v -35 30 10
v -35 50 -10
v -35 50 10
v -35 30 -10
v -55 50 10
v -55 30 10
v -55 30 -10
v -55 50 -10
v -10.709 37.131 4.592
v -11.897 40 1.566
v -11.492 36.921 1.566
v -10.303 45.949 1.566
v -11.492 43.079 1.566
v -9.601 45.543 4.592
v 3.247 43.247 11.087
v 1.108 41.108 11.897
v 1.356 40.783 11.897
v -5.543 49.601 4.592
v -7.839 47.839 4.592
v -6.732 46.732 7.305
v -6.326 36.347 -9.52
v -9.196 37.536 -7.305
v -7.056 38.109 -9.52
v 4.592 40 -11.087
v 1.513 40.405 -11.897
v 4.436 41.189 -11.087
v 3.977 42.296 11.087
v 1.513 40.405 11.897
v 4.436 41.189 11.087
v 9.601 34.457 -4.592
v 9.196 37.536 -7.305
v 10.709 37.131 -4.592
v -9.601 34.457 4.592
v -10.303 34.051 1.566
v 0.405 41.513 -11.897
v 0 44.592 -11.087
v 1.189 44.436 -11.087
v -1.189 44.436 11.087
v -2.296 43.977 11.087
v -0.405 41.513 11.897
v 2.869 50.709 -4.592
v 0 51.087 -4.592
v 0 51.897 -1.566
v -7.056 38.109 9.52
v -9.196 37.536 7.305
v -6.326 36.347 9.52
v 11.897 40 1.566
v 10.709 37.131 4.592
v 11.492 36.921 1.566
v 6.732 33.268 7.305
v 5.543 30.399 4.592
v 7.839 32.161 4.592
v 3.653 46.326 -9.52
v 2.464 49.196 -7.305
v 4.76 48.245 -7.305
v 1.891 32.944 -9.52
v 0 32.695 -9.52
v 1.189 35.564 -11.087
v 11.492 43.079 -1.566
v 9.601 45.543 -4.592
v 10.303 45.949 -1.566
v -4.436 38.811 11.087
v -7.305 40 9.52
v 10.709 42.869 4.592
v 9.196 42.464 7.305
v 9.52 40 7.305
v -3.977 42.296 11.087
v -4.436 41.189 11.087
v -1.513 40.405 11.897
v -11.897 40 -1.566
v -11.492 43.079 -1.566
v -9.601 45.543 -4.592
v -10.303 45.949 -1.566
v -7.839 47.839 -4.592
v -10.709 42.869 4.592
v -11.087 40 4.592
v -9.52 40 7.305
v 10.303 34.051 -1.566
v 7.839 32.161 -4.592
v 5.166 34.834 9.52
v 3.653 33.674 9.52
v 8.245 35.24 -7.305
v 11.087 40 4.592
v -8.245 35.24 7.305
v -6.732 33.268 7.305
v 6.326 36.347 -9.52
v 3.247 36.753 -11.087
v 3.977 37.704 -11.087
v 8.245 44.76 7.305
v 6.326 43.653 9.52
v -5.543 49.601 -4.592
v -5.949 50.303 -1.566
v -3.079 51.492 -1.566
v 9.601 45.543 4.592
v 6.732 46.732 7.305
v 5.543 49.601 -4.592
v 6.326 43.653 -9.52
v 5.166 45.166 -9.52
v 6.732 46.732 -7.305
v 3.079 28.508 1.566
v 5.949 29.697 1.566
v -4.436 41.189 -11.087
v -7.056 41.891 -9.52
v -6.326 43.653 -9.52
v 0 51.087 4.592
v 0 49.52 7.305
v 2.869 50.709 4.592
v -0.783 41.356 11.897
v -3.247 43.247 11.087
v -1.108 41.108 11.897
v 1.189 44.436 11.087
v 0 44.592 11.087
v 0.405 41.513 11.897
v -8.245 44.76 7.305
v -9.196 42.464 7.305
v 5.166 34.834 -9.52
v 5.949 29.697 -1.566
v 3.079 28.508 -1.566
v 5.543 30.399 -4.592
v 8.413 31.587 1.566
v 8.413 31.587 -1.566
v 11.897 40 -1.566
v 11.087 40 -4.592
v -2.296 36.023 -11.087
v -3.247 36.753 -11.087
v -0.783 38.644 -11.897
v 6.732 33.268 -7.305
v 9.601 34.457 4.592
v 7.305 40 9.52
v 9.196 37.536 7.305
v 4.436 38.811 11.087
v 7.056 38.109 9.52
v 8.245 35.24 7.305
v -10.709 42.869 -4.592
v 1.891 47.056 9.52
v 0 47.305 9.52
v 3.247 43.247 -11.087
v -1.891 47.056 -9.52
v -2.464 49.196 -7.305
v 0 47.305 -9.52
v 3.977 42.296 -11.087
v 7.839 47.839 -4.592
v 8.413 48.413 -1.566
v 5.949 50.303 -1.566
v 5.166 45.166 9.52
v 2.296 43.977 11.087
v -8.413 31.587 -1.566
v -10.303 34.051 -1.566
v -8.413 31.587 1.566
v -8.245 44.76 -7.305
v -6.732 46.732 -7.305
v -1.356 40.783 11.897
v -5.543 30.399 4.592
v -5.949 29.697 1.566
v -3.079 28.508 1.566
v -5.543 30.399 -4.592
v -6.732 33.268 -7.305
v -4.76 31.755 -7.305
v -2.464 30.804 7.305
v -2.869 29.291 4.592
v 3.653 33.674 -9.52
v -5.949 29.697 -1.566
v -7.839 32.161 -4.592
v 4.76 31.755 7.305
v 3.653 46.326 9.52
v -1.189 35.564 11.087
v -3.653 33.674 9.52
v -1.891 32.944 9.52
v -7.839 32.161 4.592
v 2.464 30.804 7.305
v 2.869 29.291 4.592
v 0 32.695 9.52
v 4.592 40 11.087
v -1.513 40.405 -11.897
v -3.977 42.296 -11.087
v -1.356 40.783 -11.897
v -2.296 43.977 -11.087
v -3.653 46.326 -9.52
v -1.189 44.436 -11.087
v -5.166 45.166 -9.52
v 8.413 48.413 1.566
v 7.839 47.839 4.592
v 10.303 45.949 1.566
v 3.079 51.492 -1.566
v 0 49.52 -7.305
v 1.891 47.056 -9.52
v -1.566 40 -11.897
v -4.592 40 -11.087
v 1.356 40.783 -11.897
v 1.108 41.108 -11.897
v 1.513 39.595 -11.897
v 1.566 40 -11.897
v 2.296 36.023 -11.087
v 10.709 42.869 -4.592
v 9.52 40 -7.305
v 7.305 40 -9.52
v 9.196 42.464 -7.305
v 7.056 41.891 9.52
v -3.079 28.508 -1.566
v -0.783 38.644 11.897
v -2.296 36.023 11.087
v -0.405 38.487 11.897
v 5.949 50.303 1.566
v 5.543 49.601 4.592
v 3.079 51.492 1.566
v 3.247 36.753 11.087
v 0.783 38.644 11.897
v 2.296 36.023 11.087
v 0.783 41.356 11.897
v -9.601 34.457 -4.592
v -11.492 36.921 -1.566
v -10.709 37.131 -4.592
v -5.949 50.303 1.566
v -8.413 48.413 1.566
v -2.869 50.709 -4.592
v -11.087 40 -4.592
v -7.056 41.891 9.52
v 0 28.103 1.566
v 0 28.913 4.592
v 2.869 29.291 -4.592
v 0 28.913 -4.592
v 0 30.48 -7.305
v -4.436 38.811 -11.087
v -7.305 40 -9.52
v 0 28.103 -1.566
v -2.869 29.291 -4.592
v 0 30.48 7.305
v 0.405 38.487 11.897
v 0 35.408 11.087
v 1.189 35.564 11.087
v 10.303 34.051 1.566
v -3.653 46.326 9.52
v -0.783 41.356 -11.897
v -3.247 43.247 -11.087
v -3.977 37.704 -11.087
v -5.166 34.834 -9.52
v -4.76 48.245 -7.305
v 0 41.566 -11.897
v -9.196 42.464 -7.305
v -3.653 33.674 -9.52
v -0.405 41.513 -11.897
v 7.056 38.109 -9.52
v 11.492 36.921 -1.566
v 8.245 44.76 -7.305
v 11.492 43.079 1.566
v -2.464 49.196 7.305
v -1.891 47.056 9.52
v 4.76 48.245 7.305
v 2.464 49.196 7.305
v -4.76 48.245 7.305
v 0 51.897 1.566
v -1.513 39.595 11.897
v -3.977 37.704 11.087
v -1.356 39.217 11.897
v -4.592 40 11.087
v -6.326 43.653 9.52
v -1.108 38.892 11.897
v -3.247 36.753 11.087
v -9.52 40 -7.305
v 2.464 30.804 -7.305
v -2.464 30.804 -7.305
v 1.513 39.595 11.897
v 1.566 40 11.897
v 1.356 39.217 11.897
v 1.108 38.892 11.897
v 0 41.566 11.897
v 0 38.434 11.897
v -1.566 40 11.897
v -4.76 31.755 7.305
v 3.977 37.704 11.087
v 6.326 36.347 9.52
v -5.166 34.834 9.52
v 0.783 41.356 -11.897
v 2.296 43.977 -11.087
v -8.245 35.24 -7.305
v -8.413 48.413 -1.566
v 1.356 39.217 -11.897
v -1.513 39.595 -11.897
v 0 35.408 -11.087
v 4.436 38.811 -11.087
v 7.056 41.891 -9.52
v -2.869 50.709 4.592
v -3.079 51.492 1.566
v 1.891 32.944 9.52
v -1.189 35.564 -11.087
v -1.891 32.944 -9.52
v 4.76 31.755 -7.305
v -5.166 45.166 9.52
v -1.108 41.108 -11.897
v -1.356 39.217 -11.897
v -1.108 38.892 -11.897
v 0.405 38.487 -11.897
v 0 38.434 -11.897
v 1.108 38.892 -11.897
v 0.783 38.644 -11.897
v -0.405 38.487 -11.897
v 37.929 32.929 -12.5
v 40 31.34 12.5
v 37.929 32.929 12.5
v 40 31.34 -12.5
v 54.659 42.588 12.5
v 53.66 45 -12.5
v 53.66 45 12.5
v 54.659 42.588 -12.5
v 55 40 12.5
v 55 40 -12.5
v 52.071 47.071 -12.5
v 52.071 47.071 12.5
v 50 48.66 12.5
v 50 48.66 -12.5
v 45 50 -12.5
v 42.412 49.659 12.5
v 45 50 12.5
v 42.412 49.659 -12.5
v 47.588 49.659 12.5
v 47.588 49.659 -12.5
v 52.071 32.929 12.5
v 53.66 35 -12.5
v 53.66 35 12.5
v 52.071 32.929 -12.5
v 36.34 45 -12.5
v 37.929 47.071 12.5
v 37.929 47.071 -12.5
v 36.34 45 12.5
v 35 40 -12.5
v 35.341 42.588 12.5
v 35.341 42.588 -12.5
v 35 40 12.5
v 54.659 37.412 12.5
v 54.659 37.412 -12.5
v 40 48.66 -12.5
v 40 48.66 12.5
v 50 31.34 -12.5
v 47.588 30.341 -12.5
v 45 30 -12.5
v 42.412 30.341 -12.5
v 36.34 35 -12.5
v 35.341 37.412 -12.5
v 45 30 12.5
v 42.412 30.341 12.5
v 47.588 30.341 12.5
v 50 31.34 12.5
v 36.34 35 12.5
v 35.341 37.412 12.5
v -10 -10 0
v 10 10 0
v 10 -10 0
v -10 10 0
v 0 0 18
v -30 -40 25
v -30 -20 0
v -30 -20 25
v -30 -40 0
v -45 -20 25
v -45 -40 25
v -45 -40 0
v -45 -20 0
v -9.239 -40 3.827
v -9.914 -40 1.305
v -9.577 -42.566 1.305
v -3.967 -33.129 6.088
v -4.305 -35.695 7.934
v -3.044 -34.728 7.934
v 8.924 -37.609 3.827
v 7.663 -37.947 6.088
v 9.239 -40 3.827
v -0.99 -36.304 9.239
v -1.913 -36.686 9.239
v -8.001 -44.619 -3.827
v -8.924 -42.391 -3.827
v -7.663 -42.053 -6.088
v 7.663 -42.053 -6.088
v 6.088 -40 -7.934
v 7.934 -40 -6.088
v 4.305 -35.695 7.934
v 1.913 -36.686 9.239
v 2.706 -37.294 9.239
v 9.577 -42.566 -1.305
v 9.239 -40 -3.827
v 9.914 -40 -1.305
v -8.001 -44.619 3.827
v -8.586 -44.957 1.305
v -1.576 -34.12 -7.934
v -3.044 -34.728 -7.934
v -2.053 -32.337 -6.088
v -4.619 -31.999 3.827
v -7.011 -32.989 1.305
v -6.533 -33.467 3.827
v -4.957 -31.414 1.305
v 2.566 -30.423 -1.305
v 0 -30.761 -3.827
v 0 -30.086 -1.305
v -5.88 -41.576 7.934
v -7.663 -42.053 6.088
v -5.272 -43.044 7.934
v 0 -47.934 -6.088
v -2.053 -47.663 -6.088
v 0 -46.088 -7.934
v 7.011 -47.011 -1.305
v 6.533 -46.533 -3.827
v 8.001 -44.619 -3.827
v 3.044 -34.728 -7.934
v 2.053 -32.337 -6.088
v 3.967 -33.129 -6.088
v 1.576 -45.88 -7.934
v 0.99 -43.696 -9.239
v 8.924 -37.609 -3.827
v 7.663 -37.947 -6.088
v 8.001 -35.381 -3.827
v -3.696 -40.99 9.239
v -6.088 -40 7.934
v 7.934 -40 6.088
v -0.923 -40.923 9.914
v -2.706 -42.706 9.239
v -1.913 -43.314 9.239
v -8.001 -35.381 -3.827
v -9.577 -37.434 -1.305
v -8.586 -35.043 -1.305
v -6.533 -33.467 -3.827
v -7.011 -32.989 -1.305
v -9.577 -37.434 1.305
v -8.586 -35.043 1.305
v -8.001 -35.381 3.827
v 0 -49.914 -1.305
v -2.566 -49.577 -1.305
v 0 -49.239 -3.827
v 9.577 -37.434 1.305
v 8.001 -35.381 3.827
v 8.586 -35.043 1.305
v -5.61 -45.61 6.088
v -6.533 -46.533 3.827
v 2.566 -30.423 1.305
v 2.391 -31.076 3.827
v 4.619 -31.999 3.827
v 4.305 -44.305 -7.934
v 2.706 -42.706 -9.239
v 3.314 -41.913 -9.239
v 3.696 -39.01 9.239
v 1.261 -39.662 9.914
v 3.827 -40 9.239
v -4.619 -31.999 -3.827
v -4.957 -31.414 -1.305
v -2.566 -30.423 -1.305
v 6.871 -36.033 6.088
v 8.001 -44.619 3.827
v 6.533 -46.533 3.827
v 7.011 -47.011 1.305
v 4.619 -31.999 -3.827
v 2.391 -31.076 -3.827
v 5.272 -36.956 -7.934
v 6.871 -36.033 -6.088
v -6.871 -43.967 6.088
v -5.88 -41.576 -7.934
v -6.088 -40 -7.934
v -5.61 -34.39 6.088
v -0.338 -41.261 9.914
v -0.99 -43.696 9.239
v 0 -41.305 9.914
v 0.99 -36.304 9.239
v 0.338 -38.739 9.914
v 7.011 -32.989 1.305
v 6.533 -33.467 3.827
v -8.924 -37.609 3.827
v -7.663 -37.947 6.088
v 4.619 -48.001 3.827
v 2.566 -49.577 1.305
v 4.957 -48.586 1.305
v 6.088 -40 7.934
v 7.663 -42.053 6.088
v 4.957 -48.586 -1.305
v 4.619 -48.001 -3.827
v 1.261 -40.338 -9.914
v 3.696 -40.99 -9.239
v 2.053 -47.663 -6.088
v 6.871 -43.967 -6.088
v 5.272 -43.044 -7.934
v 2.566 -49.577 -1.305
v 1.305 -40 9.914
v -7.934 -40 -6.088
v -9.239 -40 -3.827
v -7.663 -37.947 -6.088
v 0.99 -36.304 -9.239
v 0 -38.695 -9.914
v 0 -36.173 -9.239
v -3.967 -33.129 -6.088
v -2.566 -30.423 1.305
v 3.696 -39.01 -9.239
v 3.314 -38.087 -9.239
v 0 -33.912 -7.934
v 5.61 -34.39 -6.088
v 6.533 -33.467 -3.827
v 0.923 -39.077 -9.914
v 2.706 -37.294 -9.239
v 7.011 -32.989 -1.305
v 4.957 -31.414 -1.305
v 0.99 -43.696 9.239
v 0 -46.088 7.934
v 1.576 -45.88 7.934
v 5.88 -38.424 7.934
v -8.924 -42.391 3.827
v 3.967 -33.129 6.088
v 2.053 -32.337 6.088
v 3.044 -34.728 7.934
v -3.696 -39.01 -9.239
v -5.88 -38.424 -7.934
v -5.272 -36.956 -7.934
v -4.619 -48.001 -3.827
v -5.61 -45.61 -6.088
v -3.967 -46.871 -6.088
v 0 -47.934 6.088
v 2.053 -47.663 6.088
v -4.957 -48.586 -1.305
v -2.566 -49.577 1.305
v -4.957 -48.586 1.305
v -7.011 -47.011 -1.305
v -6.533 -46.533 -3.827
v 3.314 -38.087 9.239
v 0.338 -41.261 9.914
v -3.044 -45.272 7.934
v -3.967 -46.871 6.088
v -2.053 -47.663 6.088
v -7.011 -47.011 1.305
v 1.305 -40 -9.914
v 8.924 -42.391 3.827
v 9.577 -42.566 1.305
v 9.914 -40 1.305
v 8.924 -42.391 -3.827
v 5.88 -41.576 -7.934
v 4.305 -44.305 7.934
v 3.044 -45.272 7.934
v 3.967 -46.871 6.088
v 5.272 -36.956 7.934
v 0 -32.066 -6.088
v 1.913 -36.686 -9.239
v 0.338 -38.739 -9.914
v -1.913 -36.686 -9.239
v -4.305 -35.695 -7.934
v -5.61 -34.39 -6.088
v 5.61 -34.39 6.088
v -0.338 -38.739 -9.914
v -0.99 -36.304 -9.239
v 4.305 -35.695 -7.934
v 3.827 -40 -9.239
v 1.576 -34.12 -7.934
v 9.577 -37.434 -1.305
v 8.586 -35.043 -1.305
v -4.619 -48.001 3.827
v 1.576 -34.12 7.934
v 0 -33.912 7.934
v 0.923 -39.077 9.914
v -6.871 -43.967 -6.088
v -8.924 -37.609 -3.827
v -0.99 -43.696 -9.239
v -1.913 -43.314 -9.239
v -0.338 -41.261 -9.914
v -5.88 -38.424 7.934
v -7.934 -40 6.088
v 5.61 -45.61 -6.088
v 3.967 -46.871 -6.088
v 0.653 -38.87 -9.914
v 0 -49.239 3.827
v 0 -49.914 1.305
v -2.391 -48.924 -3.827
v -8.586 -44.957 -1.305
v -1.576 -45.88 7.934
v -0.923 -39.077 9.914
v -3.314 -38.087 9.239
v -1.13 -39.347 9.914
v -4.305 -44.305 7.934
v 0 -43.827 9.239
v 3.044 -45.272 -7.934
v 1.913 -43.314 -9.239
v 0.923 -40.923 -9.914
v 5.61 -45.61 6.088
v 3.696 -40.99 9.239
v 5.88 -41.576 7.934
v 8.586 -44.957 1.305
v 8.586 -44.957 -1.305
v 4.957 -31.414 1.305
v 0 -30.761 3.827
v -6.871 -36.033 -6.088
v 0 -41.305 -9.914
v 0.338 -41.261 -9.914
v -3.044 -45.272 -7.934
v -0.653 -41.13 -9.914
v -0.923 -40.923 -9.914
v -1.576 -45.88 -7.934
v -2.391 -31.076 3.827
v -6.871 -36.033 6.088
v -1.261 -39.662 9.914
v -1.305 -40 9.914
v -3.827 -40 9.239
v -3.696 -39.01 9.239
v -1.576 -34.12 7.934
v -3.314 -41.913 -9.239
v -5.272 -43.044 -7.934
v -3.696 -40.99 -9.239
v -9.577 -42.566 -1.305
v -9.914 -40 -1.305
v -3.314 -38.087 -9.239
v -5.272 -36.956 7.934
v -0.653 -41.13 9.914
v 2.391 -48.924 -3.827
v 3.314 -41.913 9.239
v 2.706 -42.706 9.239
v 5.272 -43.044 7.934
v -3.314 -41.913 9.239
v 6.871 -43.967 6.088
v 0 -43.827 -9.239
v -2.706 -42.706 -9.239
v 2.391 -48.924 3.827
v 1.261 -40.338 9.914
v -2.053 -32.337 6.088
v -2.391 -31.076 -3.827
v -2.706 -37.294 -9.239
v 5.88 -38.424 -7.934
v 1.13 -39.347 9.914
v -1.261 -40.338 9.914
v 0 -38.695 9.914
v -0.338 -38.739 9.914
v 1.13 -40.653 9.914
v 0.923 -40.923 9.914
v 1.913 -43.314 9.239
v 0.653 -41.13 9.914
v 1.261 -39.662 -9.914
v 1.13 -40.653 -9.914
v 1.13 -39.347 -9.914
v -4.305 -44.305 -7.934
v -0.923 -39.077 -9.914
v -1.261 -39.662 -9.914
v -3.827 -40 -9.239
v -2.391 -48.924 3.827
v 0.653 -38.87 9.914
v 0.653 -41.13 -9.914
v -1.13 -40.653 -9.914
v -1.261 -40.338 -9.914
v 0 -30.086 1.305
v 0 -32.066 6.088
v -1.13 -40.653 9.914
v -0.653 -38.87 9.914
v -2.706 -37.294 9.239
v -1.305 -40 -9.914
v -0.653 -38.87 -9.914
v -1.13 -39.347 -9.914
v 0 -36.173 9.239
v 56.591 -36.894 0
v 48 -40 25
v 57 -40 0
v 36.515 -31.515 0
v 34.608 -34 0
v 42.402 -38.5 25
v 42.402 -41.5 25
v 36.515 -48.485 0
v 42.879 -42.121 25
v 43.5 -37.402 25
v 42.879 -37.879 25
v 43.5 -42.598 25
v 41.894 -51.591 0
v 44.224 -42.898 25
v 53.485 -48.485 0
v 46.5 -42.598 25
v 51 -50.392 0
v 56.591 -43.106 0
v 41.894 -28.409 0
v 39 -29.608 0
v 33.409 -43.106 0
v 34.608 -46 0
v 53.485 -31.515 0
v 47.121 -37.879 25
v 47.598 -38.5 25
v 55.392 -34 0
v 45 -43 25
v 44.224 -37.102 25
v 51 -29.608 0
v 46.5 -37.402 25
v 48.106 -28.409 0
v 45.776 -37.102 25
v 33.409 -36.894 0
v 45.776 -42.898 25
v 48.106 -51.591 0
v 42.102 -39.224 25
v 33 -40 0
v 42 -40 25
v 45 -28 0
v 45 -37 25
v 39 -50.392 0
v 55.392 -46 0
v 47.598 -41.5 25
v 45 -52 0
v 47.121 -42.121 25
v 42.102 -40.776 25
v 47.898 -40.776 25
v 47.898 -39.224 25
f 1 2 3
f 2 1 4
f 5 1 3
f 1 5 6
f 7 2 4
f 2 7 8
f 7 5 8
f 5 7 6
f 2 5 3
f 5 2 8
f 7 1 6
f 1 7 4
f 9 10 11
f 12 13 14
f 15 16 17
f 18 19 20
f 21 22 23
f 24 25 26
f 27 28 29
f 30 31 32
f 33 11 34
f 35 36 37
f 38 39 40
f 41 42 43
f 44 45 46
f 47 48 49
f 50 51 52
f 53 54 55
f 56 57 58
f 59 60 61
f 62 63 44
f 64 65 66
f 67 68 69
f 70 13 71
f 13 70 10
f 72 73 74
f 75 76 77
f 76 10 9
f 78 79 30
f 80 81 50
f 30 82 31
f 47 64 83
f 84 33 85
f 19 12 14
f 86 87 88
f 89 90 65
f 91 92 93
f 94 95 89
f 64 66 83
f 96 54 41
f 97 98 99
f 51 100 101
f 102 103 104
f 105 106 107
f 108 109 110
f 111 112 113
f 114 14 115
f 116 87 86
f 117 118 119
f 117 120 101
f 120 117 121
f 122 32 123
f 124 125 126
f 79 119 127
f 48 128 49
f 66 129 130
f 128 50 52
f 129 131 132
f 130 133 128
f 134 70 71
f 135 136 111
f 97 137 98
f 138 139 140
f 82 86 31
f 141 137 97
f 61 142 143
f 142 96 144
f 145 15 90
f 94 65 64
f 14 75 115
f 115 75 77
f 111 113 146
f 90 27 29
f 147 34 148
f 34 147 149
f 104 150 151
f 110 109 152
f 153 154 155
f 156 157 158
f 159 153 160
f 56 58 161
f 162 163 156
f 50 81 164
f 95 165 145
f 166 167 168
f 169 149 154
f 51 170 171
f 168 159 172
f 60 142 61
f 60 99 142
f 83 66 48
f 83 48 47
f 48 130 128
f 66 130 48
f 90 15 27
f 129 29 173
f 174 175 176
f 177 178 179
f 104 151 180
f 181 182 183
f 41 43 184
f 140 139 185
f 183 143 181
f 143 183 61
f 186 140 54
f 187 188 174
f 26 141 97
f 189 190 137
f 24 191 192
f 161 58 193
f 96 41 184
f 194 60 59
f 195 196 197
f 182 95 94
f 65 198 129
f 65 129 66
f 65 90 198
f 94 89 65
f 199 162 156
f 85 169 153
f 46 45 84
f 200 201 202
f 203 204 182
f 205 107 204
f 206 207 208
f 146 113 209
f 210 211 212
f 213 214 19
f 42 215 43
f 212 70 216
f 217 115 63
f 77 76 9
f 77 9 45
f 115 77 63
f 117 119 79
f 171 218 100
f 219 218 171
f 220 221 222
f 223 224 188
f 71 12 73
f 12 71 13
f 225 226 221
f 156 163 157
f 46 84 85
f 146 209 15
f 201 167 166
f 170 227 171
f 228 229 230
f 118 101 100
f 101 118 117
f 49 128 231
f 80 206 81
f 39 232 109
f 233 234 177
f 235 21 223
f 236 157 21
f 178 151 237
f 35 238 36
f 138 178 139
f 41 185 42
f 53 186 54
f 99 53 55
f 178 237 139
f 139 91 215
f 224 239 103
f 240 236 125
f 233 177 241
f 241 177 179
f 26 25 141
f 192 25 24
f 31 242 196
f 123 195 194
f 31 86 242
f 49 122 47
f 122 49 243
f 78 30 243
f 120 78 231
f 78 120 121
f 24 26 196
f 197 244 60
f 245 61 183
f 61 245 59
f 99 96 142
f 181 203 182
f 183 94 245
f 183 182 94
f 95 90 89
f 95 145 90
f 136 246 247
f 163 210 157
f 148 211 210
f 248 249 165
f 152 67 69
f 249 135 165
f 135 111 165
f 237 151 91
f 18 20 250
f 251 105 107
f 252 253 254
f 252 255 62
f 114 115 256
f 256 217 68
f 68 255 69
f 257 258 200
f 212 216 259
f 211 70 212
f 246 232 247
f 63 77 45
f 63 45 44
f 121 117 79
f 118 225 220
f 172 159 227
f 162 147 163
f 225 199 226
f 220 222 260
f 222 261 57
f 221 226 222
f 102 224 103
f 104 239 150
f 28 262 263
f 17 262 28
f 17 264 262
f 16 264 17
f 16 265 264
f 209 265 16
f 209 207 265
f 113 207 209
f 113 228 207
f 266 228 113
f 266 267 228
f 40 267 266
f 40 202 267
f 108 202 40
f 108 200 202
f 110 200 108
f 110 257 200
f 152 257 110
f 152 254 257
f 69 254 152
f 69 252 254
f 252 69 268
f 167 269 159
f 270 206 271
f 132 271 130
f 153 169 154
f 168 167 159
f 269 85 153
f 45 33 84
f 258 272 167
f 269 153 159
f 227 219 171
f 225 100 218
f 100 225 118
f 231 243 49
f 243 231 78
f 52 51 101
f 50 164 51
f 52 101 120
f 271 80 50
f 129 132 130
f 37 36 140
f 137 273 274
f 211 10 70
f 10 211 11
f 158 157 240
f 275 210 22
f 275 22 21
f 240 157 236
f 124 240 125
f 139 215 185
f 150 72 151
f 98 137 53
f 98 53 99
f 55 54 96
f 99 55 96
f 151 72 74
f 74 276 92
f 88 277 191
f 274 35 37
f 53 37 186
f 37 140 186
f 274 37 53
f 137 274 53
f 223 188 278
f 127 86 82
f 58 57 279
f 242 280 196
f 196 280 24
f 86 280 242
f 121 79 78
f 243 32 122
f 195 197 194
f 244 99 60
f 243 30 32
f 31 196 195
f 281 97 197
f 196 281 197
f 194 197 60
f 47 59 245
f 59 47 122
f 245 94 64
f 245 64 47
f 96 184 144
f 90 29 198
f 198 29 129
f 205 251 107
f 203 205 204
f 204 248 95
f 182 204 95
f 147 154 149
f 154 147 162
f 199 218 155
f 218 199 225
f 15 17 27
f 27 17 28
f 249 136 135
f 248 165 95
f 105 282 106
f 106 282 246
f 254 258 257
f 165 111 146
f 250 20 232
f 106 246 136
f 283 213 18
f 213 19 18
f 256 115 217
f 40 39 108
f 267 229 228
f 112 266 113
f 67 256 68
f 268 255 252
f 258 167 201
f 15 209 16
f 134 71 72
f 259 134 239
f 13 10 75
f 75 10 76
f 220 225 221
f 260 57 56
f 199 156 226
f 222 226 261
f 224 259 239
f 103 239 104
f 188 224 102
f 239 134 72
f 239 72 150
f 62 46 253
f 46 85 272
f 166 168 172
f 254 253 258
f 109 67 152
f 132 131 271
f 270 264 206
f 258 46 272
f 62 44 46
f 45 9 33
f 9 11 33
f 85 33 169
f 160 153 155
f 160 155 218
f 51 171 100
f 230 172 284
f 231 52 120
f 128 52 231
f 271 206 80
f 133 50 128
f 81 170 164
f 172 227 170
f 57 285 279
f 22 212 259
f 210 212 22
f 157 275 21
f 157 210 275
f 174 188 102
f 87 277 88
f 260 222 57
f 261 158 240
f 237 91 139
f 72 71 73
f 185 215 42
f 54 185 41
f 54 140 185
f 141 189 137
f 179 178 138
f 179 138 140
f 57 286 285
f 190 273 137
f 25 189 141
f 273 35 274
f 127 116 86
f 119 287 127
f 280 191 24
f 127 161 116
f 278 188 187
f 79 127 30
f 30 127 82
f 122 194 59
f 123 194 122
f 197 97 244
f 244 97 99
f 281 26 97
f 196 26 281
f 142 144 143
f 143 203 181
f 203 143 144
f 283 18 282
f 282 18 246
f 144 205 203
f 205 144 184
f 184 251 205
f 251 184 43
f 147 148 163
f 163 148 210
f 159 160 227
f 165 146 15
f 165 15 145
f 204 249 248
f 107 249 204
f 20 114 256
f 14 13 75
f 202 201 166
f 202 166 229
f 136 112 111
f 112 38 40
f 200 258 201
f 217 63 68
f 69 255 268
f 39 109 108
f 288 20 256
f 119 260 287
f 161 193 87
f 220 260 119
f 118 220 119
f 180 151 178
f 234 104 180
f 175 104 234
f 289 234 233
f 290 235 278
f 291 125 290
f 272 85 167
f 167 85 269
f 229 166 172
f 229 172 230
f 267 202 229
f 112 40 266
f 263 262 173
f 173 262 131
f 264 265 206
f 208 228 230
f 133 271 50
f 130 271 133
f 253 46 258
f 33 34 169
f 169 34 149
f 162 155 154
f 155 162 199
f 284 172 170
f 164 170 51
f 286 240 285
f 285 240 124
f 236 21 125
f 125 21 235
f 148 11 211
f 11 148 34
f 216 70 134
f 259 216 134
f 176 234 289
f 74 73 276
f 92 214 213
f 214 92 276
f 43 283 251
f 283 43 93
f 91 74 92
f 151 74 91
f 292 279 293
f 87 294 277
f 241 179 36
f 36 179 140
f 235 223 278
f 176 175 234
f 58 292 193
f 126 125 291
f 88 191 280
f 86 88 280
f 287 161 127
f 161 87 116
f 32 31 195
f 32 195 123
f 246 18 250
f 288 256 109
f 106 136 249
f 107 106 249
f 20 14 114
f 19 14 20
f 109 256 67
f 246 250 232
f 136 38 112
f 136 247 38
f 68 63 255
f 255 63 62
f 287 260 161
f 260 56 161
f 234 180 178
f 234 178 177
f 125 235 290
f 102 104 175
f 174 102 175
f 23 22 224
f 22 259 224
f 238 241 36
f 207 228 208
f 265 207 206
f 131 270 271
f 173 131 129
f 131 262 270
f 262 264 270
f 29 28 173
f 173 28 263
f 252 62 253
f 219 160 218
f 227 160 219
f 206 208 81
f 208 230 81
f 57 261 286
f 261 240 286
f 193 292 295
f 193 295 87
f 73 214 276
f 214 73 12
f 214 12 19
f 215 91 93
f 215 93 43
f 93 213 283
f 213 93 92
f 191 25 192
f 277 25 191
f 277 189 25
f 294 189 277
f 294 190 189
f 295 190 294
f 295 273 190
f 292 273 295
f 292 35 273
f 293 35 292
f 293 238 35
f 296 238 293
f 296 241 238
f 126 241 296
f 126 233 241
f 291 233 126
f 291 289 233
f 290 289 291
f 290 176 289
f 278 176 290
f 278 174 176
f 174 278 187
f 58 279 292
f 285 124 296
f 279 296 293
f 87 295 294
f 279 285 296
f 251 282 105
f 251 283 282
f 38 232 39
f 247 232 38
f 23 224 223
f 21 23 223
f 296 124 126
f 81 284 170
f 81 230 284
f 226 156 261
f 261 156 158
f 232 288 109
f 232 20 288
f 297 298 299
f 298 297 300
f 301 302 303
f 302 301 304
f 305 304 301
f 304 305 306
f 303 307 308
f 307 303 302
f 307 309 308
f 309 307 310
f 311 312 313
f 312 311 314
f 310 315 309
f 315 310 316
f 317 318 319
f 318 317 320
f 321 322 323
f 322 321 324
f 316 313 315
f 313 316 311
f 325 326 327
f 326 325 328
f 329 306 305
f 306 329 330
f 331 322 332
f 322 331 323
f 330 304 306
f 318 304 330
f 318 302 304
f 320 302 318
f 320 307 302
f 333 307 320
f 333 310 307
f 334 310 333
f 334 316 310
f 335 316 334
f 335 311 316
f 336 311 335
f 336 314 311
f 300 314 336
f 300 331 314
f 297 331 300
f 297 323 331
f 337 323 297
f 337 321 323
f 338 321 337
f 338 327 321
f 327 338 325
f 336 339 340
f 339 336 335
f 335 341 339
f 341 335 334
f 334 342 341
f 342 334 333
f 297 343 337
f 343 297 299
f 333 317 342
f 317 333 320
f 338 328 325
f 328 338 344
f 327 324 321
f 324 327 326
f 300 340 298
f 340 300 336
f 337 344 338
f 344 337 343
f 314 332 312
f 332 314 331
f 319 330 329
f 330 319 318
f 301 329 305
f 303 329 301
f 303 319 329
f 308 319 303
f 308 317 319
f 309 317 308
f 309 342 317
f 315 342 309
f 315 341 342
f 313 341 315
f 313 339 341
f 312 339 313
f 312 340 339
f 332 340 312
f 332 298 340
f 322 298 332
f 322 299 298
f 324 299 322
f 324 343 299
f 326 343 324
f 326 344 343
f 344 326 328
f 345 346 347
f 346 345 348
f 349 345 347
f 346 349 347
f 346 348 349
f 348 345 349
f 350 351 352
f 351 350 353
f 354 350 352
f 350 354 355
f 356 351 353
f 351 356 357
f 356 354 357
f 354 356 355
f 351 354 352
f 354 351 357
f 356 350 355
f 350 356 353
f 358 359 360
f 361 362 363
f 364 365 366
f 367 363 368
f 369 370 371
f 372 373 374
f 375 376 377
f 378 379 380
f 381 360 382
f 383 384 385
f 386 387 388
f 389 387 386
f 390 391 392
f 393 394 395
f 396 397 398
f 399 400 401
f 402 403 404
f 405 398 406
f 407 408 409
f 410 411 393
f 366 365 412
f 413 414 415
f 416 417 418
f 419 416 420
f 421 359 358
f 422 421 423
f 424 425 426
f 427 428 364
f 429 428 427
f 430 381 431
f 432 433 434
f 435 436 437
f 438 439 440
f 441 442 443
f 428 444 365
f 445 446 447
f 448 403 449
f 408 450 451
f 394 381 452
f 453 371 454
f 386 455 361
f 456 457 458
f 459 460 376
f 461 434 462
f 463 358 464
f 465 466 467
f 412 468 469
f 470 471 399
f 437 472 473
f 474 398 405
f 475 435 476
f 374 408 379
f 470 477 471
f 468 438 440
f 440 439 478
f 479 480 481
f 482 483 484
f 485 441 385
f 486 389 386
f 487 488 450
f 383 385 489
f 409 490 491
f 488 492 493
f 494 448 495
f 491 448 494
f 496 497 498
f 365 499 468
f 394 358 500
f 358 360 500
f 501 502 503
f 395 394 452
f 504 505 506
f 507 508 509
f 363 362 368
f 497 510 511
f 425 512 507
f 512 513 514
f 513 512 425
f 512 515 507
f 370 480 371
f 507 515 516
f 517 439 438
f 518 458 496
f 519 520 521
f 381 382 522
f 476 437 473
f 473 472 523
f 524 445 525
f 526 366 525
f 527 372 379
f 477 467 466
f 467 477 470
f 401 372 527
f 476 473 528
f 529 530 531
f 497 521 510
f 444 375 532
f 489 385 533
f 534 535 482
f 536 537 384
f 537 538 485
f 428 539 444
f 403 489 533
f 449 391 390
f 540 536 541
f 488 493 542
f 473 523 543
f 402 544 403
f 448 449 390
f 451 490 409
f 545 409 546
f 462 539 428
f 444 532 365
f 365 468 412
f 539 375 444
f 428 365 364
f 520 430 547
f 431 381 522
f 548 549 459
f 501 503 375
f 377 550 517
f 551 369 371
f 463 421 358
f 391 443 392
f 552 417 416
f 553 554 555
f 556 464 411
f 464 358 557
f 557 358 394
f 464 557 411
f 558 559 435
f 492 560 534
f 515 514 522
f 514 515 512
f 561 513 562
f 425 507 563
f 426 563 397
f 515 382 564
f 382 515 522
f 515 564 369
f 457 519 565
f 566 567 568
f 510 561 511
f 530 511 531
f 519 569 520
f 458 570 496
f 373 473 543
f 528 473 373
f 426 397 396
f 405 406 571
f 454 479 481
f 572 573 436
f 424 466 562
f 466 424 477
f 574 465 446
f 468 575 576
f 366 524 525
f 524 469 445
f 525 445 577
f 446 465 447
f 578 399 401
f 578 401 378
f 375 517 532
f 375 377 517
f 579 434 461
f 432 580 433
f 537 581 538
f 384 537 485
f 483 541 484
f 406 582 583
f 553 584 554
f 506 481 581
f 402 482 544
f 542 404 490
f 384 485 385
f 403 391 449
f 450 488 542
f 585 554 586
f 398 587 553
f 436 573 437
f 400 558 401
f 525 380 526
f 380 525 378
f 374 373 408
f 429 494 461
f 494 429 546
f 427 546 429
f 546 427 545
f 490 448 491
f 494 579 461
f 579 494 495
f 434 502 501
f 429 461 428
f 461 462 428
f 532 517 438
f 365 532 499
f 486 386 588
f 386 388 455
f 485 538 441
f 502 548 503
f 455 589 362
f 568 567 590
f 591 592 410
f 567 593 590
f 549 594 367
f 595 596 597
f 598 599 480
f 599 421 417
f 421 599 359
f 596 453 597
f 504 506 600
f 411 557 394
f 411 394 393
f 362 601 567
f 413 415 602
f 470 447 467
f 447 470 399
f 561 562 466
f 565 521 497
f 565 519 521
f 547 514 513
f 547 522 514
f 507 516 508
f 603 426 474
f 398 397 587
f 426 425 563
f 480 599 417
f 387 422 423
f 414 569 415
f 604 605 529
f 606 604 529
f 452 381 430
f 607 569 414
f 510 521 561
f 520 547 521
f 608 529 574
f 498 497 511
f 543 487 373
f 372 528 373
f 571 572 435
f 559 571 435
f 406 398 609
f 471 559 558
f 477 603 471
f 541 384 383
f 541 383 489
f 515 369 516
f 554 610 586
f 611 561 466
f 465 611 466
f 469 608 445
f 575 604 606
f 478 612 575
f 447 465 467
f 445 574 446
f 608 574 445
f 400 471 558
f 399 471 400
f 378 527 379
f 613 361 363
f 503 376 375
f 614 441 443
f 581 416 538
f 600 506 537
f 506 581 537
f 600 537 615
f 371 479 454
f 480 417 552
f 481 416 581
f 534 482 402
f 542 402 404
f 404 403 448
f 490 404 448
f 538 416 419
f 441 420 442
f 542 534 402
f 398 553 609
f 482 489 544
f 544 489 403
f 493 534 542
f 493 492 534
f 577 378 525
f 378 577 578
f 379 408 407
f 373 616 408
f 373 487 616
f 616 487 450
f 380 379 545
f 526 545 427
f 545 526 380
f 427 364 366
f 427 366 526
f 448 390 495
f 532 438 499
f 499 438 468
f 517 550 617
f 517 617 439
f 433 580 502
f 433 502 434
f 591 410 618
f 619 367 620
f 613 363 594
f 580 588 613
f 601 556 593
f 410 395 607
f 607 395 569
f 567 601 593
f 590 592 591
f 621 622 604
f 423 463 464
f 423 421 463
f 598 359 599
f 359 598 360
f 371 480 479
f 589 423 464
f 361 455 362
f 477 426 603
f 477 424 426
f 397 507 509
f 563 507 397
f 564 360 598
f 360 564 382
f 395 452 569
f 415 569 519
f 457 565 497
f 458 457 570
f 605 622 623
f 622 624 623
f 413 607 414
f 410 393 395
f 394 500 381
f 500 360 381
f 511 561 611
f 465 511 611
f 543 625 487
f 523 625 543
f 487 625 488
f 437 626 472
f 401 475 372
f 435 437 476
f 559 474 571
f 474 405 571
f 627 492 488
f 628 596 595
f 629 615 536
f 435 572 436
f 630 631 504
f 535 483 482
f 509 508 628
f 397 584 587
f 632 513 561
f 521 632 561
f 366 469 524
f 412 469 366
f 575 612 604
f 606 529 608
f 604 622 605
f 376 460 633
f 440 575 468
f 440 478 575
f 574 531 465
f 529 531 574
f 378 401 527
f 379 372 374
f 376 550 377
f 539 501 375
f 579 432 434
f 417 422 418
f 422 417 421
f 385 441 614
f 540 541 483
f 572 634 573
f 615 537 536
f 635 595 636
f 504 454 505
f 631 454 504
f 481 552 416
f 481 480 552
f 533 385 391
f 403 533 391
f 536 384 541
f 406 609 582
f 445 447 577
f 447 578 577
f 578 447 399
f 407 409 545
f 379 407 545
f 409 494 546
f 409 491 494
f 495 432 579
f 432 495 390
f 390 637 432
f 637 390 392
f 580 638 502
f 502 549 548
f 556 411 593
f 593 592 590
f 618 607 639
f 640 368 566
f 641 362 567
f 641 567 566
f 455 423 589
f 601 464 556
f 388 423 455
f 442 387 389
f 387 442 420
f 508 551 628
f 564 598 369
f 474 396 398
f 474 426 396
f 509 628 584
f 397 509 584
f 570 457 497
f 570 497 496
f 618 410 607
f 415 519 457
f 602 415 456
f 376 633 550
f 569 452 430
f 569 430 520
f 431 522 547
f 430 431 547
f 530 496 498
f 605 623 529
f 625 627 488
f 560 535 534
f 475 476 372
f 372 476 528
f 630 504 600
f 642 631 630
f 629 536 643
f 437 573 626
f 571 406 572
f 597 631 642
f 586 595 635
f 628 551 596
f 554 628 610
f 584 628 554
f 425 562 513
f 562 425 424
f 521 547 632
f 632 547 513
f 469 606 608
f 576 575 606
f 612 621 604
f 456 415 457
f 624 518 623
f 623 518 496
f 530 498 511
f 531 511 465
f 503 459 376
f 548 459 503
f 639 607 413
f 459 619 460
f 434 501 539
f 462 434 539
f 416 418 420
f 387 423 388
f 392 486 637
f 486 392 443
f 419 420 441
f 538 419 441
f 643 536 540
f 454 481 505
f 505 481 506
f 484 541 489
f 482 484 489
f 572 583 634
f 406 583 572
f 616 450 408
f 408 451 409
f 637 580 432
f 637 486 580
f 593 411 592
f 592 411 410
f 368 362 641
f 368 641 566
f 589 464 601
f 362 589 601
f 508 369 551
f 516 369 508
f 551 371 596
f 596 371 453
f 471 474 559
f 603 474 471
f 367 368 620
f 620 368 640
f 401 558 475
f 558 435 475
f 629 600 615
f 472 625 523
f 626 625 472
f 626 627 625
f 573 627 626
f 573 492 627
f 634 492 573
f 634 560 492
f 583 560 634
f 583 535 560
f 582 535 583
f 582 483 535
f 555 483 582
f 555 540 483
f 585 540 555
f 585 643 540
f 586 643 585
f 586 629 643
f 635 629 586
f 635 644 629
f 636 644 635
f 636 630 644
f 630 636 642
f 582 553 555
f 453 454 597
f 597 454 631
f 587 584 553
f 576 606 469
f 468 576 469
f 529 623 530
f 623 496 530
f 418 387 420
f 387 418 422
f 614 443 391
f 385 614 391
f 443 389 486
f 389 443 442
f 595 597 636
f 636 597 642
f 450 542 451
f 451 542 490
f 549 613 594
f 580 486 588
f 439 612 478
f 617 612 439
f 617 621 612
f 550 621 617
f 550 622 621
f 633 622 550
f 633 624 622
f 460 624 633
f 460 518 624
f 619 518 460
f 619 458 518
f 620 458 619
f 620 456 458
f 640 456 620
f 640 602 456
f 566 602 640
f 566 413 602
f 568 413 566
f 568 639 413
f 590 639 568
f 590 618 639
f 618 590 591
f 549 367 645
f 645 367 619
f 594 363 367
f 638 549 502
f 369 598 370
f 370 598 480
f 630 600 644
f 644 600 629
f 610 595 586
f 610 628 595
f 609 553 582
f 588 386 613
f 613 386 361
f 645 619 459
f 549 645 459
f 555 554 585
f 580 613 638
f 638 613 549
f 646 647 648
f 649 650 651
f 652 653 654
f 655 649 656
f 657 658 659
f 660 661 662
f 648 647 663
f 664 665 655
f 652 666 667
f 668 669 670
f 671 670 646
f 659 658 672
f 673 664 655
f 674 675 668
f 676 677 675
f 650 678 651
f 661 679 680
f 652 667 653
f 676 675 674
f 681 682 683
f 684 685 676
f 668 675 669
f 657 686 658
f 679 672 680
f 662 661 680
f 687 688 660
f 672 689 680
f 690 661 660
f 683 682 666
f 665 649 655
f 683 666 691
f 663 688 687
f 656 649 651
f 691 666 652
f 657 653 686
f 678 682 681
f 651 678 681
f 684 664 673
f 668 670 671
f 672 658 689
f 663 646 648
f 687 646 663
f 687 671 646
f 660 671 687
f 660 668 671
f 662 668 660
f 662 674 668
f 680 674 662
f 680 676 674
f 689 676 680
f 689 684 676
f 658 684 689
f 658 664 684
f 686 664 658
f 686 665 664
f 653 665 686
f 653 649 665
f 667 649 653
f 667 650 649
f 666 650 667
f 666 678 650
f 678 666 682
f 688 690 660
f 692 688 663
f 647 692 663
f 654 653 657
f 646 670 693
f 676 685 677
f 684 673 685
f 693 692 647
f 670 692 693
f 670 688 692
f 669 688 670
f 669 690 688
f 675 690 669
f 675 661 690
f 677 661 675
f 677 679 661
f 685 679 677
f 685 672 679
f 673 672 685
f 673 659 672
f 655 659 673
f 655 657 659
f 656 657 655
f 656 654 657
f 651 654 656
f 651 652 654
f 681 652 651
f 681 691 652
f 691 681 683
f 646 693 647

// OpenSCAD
// OpenSCAD Primitive Solids Test Suite
// Based on: https://en.wikibooks.org/wiki/OpenSCAD_User_Manual/Primitive_Solids

$fn = 24; // Standard resolution for curves

// ==========================================
// ROW 1: Standard Primitives (Top Row)
// ==========================================

// 1. Centered Cube
translate([-45, 40, 0]) {
    color("dodgerblue") 
        cube(size = [20, 20, 20], center = true);
}

// 2. Sphere using Radius (r)
translate([0, 40, 0]) {
    color("limegreen") 
        sphere(r = 12);
}

// 3. Centered Cylinder
translate([45, 40, 0]) {
    color("orangered") 
        cylinder(h = 25, r = 10, center = true);
}


// ==========================================
// ROW 2: Polyhedron Primitive (Center)
// ==========================================

// 4. Square-based Pyramid (Polyhedron)
// Points defined in 3D space, base at z=0, apex at z=18
pyramid_points = [
  [-10, -10, 0],  // 0: Bottom-Left
  [10, -10, 0],   // 1: Bottom-Right
  [10, 10, 0],    // 2: Top-Right
  [-10, 10, 0],   // 3: Top-Left
  [0, 0, 18]      // 4: Apex
];

// Polygonal faces (vertices in CCW order when looking from the outside)
pyramid_faces = [
  [3, 2, 1, 0],   // Base face
  [0, 1, 4],      // Front triangle
  [1, 2, 4],      // Right triangle
  [2, 3, 4],      // Back triangle
  [3, 0, 4]       // Left triangle
];

translate([0, 0, 0]) {
    color("crimson") 
        polyhedron(points = pyramid_points, faces = pyramid_faces);
}


// ==========================================
// ROW 3: Custom Parameters & Cones (Bottom Row)
// ==========================================

// 5. Non-Centered Rectangular Block (Cube with 3D size array)
translate([-45, -40, 0]) {
    color("gold") 
        cube(size = [15, 20, 25], center = false);
}

// 6. Sphere using Diameter (d)
translate([0, -40, 0]) {
    color("mediumorchid") 
        sphere(d = 20);
}

// 7. Cone (Cylinder with different r1 and r2)
translate([45, -40, 0]) {
    color("darkturquoise") 
        cylinder(h = 25, r1 = 12, r2 = 3, center = false);
}
